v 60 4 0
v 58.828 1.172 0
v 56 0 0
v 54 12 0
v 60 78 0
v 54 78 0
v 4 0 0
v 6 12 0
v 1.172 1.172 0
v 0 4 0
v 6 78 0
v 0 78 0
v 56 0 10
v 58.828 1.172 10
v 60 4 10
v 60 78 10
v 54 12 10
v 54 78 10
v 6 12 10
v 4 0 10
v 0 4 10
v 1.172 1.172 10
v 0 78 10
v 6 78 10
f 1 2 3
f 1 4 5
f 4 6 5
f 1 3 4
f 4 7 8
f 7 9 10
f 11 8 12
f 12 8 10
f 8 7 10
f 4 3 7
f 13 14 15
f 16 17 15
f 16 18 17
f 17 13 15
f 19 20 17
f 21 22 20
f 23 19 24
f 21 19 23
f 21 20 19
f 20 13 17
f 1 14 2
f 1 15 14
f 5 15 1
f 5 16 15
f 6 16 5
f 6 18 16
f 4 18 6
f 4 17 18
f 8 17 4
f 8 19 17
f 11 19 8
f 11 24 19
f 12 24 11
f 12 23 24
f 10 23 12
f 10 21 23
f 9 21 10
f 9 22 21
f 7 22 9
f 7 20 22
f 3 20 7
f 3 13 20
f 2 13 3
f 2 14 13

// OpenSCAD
$fn = 32;

// ----------------------------------------------------------------------
// Heat sink frame: 60 x 78 mm frame, 6 mm walls
// ----------------------------------------------------------------------

// --- parameters (mm) ---
profile_height = 10;      // extrusion height
profile_points = 12;      // points of the closed outline

profile = [[0, 4], [1.172, 1.172], [4, 0], [56, 0], [58.828, 1.172], [60, 4], [60, 78], [54, 78], [54, 12], [6, 12], [6, 78], [0, 78]];  // single closed polygon, 12 points, counter clockwise

// --- the one profile operation ---
linear_extrude(height = profile_height) polygon(points = profile);
